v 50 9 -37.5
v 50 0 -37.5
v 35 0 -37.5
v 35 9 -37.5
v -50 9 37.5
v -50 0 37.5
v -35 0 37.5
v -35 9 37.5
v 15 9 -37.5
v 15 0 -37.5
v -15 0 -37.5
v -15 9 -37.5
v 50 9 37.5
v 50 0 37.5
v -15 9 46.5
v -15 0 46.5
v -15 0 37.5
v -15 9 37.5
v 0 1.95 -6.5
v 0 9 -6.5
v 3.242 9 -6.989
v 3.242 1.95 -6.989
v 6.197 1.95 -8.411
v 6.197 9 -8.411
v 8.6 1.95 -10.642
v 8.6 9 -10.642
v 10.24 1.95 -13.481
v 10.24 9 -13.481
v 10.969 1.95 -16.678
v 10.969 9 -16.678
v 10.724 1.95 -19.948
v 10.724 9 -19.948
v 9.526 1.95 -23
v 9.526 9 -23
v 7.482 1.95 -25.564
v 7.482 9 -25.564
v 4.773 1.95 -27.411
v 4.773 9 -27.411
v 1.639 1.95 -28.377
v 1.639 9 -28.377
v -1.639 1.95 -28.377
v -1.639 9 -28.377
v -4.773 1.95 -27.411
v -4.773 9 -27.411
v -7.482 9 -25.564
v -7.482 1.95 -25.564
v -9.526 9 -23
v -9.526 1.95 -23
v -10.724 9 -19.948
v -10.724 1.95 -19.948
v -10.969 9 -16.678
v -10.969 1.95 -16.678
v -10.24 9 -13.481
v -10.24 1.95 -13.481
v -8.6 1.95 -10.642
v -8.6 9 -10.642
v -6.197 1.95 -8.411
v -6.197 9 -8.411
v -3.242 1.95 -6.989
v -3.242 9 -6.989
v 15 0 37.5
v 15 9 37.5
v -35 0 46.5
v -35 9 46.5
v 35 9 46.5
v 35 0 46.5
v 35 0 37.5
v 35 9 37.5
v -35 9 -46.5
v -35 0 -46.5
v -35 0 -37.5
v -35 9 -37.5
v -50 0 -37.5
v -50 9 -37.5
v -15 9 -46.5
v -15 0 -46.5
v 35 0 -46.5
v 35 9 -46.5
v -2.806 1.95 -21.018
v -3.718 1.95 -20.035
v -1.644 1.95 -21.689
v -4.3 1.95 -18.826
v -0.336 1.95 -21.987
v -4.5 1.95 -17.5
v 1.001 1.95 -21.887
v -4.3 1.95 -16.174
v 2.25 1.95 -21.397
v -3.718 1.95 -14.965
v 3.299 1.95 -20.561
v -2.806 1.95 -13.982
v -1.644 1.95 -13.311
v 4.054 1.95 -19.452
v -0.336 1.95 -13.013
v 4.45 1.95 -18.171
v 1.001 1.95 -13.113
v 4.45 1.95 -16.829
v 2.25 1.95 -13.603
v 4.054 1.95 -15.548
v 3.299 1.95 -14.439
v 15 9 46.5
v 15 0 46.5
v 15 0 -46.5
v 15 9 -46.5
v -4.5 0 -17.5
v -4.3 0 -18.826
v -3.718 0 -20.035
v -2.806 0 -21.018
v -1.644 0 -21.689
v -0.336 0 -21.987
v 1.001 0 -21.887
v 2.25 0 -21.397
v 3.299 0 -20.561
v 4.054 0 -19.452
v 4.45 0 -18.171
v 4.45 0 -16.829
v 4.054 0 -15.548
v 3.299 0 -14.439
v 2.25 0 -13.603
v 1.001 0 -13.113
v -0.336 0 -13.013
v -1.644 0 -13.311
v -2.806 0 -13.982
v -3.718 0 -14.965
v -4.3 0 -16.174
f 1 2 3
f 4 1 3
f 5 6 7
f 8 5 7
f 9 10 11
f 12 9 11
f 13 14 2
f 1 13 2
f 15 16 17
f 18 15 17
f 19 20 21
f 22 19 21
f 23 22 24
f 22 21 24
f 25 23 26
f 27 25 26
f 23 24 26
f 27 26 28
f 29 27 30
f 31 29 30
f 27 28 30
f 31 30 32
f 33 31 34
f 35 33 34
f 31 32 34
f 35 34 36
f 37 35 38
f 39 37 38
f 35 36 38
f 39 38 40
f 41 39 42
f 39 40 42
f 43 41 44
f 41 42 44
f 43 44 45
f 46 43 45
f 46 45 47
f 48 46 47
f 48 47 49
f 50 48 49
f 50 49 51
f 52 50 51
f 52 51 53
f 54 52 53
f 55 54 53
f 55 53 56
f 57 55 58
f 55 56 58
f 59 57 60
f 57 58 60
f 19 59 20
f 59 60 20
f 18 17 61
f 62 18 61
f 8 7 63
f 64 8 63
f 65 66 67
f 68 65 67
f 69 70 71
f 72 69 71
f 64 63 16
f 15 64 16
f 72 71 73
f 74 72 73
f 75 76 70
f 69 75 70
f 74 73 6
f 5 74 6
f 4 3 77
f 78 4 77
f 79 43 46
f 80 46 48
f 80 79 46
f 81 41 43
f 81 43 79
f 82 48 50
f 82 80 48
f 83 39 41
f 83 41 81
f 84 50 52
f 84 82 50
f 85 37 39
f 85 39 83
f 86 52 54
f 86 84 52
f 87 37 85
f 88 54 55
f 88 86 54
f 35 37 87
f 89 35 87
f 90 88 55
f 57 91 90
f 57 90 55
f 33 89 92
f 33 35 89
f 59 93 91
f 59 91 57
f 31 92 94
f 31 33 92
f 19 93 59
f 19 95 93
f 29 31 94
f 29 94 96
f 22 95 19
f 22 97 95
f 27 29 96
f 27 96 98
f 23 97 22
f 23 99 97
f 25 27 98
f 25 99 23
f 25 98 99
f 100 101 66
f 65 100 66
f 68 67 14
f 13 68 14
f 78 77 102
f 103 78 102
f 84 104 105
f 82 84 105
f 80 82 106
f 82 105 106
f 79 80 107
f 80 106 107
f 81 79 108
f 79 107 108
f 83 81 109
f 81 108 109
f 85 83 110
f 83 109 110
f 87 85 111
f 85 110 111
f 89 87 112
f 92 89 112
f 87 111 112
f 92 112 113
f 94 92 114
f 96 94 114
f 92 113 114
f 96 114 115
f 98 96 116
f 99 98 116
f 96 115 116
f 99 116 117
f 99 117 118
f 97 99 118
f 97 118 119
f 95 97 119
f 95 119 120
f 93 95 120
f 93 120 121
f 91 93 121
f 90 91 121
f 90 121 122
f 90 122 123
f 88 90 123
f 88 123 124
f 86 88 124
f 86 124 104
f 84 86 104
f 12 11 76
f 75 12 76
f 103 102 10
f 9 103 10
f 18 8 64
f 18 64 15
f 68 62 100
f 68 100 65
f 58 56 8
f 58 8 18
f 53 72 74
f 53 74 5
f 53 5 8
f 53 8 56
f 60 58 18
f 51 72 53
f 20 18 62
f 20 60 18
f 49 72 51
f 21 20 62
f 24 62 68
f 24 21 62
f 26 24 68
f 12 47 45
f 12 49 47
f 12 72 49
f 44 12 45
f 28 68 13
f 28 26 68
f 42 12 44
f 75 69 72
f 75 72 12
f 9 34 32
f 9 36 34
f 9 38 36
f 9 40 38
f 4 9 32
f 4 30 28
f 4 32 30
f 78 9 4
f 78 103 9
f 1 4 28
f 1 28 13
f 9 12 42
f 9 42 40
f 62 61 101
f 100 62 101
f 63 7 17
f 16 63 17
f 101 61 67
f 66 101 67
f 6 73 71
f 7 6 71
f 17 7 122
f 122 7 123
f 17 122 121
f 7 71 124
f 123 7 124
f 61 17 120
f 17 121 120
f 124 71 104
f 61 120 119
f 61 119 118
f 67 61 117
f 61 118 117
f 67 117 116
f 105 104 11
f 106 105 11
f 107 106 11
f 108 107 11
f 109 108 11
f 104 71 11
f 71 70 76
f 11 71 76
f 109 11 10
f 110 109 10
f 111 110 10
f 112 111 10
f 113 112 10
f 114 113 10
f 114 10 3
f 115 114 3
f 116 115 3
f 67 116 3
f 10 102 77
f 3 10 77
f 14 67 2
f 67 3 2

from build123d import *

# Parameters (mm, degrees)
BOSS_EXTRUDE1_DEPTH = 9
SKETCH3_R           = 11
CUT_EXTRUDE1_DEPTH  = 7.05


with BuildPart() as part:
    # Sketch2 → Boss-Extrude1 (new body)
    with BuildSketch(Plane(origin=(0, 0, 0), x_dir=(1, 0, 0), z_dir=(0, 1, 0))):
        Polygon((-35, 37.5), (-50, 37.5), (-50, -37.5), (-35, -37.5), (-35, -46.5), (-15, -46.5), (-15, -37.5), (15, -37.5), (15, -46.5), (35, -46.5), (35, -37.5), (50, -37.5), (50, 37.5), (35, 37.5), (35, 46.5), (15, 46.5), (15, 37.5), (-15, 37.5), (-15, 46.5), (-35, 46.5), align=None)
        with BuildLine():
            ThreePointArc((4.5, 17.5), (0, 13), (-4.5, 17.5))
            ThreePointArc((-4.5, 17.5), (0, 22), (4.5, 17.5))
        make_face(mode=Mode.SUBTRACT)
    extrude(amount=BOSS_EXTRUDE1_DEPTH)

    # Sketch3 → Cut-Extrude1 (cut)
    with BuildSketch(Plane(origin=(0, 9, 0), x_dir=(1, 0, 0), z_dir=(0, 1, 0))):
        with Locations(Location((0, 17.5, 0), (0, 0, 270))):
            Circle(SKETCH3_R)
    extrude(amount=-CUT_EXTRUDE1_DEPTH, mode=Mode.SUBTRACT)


solid = part.part
